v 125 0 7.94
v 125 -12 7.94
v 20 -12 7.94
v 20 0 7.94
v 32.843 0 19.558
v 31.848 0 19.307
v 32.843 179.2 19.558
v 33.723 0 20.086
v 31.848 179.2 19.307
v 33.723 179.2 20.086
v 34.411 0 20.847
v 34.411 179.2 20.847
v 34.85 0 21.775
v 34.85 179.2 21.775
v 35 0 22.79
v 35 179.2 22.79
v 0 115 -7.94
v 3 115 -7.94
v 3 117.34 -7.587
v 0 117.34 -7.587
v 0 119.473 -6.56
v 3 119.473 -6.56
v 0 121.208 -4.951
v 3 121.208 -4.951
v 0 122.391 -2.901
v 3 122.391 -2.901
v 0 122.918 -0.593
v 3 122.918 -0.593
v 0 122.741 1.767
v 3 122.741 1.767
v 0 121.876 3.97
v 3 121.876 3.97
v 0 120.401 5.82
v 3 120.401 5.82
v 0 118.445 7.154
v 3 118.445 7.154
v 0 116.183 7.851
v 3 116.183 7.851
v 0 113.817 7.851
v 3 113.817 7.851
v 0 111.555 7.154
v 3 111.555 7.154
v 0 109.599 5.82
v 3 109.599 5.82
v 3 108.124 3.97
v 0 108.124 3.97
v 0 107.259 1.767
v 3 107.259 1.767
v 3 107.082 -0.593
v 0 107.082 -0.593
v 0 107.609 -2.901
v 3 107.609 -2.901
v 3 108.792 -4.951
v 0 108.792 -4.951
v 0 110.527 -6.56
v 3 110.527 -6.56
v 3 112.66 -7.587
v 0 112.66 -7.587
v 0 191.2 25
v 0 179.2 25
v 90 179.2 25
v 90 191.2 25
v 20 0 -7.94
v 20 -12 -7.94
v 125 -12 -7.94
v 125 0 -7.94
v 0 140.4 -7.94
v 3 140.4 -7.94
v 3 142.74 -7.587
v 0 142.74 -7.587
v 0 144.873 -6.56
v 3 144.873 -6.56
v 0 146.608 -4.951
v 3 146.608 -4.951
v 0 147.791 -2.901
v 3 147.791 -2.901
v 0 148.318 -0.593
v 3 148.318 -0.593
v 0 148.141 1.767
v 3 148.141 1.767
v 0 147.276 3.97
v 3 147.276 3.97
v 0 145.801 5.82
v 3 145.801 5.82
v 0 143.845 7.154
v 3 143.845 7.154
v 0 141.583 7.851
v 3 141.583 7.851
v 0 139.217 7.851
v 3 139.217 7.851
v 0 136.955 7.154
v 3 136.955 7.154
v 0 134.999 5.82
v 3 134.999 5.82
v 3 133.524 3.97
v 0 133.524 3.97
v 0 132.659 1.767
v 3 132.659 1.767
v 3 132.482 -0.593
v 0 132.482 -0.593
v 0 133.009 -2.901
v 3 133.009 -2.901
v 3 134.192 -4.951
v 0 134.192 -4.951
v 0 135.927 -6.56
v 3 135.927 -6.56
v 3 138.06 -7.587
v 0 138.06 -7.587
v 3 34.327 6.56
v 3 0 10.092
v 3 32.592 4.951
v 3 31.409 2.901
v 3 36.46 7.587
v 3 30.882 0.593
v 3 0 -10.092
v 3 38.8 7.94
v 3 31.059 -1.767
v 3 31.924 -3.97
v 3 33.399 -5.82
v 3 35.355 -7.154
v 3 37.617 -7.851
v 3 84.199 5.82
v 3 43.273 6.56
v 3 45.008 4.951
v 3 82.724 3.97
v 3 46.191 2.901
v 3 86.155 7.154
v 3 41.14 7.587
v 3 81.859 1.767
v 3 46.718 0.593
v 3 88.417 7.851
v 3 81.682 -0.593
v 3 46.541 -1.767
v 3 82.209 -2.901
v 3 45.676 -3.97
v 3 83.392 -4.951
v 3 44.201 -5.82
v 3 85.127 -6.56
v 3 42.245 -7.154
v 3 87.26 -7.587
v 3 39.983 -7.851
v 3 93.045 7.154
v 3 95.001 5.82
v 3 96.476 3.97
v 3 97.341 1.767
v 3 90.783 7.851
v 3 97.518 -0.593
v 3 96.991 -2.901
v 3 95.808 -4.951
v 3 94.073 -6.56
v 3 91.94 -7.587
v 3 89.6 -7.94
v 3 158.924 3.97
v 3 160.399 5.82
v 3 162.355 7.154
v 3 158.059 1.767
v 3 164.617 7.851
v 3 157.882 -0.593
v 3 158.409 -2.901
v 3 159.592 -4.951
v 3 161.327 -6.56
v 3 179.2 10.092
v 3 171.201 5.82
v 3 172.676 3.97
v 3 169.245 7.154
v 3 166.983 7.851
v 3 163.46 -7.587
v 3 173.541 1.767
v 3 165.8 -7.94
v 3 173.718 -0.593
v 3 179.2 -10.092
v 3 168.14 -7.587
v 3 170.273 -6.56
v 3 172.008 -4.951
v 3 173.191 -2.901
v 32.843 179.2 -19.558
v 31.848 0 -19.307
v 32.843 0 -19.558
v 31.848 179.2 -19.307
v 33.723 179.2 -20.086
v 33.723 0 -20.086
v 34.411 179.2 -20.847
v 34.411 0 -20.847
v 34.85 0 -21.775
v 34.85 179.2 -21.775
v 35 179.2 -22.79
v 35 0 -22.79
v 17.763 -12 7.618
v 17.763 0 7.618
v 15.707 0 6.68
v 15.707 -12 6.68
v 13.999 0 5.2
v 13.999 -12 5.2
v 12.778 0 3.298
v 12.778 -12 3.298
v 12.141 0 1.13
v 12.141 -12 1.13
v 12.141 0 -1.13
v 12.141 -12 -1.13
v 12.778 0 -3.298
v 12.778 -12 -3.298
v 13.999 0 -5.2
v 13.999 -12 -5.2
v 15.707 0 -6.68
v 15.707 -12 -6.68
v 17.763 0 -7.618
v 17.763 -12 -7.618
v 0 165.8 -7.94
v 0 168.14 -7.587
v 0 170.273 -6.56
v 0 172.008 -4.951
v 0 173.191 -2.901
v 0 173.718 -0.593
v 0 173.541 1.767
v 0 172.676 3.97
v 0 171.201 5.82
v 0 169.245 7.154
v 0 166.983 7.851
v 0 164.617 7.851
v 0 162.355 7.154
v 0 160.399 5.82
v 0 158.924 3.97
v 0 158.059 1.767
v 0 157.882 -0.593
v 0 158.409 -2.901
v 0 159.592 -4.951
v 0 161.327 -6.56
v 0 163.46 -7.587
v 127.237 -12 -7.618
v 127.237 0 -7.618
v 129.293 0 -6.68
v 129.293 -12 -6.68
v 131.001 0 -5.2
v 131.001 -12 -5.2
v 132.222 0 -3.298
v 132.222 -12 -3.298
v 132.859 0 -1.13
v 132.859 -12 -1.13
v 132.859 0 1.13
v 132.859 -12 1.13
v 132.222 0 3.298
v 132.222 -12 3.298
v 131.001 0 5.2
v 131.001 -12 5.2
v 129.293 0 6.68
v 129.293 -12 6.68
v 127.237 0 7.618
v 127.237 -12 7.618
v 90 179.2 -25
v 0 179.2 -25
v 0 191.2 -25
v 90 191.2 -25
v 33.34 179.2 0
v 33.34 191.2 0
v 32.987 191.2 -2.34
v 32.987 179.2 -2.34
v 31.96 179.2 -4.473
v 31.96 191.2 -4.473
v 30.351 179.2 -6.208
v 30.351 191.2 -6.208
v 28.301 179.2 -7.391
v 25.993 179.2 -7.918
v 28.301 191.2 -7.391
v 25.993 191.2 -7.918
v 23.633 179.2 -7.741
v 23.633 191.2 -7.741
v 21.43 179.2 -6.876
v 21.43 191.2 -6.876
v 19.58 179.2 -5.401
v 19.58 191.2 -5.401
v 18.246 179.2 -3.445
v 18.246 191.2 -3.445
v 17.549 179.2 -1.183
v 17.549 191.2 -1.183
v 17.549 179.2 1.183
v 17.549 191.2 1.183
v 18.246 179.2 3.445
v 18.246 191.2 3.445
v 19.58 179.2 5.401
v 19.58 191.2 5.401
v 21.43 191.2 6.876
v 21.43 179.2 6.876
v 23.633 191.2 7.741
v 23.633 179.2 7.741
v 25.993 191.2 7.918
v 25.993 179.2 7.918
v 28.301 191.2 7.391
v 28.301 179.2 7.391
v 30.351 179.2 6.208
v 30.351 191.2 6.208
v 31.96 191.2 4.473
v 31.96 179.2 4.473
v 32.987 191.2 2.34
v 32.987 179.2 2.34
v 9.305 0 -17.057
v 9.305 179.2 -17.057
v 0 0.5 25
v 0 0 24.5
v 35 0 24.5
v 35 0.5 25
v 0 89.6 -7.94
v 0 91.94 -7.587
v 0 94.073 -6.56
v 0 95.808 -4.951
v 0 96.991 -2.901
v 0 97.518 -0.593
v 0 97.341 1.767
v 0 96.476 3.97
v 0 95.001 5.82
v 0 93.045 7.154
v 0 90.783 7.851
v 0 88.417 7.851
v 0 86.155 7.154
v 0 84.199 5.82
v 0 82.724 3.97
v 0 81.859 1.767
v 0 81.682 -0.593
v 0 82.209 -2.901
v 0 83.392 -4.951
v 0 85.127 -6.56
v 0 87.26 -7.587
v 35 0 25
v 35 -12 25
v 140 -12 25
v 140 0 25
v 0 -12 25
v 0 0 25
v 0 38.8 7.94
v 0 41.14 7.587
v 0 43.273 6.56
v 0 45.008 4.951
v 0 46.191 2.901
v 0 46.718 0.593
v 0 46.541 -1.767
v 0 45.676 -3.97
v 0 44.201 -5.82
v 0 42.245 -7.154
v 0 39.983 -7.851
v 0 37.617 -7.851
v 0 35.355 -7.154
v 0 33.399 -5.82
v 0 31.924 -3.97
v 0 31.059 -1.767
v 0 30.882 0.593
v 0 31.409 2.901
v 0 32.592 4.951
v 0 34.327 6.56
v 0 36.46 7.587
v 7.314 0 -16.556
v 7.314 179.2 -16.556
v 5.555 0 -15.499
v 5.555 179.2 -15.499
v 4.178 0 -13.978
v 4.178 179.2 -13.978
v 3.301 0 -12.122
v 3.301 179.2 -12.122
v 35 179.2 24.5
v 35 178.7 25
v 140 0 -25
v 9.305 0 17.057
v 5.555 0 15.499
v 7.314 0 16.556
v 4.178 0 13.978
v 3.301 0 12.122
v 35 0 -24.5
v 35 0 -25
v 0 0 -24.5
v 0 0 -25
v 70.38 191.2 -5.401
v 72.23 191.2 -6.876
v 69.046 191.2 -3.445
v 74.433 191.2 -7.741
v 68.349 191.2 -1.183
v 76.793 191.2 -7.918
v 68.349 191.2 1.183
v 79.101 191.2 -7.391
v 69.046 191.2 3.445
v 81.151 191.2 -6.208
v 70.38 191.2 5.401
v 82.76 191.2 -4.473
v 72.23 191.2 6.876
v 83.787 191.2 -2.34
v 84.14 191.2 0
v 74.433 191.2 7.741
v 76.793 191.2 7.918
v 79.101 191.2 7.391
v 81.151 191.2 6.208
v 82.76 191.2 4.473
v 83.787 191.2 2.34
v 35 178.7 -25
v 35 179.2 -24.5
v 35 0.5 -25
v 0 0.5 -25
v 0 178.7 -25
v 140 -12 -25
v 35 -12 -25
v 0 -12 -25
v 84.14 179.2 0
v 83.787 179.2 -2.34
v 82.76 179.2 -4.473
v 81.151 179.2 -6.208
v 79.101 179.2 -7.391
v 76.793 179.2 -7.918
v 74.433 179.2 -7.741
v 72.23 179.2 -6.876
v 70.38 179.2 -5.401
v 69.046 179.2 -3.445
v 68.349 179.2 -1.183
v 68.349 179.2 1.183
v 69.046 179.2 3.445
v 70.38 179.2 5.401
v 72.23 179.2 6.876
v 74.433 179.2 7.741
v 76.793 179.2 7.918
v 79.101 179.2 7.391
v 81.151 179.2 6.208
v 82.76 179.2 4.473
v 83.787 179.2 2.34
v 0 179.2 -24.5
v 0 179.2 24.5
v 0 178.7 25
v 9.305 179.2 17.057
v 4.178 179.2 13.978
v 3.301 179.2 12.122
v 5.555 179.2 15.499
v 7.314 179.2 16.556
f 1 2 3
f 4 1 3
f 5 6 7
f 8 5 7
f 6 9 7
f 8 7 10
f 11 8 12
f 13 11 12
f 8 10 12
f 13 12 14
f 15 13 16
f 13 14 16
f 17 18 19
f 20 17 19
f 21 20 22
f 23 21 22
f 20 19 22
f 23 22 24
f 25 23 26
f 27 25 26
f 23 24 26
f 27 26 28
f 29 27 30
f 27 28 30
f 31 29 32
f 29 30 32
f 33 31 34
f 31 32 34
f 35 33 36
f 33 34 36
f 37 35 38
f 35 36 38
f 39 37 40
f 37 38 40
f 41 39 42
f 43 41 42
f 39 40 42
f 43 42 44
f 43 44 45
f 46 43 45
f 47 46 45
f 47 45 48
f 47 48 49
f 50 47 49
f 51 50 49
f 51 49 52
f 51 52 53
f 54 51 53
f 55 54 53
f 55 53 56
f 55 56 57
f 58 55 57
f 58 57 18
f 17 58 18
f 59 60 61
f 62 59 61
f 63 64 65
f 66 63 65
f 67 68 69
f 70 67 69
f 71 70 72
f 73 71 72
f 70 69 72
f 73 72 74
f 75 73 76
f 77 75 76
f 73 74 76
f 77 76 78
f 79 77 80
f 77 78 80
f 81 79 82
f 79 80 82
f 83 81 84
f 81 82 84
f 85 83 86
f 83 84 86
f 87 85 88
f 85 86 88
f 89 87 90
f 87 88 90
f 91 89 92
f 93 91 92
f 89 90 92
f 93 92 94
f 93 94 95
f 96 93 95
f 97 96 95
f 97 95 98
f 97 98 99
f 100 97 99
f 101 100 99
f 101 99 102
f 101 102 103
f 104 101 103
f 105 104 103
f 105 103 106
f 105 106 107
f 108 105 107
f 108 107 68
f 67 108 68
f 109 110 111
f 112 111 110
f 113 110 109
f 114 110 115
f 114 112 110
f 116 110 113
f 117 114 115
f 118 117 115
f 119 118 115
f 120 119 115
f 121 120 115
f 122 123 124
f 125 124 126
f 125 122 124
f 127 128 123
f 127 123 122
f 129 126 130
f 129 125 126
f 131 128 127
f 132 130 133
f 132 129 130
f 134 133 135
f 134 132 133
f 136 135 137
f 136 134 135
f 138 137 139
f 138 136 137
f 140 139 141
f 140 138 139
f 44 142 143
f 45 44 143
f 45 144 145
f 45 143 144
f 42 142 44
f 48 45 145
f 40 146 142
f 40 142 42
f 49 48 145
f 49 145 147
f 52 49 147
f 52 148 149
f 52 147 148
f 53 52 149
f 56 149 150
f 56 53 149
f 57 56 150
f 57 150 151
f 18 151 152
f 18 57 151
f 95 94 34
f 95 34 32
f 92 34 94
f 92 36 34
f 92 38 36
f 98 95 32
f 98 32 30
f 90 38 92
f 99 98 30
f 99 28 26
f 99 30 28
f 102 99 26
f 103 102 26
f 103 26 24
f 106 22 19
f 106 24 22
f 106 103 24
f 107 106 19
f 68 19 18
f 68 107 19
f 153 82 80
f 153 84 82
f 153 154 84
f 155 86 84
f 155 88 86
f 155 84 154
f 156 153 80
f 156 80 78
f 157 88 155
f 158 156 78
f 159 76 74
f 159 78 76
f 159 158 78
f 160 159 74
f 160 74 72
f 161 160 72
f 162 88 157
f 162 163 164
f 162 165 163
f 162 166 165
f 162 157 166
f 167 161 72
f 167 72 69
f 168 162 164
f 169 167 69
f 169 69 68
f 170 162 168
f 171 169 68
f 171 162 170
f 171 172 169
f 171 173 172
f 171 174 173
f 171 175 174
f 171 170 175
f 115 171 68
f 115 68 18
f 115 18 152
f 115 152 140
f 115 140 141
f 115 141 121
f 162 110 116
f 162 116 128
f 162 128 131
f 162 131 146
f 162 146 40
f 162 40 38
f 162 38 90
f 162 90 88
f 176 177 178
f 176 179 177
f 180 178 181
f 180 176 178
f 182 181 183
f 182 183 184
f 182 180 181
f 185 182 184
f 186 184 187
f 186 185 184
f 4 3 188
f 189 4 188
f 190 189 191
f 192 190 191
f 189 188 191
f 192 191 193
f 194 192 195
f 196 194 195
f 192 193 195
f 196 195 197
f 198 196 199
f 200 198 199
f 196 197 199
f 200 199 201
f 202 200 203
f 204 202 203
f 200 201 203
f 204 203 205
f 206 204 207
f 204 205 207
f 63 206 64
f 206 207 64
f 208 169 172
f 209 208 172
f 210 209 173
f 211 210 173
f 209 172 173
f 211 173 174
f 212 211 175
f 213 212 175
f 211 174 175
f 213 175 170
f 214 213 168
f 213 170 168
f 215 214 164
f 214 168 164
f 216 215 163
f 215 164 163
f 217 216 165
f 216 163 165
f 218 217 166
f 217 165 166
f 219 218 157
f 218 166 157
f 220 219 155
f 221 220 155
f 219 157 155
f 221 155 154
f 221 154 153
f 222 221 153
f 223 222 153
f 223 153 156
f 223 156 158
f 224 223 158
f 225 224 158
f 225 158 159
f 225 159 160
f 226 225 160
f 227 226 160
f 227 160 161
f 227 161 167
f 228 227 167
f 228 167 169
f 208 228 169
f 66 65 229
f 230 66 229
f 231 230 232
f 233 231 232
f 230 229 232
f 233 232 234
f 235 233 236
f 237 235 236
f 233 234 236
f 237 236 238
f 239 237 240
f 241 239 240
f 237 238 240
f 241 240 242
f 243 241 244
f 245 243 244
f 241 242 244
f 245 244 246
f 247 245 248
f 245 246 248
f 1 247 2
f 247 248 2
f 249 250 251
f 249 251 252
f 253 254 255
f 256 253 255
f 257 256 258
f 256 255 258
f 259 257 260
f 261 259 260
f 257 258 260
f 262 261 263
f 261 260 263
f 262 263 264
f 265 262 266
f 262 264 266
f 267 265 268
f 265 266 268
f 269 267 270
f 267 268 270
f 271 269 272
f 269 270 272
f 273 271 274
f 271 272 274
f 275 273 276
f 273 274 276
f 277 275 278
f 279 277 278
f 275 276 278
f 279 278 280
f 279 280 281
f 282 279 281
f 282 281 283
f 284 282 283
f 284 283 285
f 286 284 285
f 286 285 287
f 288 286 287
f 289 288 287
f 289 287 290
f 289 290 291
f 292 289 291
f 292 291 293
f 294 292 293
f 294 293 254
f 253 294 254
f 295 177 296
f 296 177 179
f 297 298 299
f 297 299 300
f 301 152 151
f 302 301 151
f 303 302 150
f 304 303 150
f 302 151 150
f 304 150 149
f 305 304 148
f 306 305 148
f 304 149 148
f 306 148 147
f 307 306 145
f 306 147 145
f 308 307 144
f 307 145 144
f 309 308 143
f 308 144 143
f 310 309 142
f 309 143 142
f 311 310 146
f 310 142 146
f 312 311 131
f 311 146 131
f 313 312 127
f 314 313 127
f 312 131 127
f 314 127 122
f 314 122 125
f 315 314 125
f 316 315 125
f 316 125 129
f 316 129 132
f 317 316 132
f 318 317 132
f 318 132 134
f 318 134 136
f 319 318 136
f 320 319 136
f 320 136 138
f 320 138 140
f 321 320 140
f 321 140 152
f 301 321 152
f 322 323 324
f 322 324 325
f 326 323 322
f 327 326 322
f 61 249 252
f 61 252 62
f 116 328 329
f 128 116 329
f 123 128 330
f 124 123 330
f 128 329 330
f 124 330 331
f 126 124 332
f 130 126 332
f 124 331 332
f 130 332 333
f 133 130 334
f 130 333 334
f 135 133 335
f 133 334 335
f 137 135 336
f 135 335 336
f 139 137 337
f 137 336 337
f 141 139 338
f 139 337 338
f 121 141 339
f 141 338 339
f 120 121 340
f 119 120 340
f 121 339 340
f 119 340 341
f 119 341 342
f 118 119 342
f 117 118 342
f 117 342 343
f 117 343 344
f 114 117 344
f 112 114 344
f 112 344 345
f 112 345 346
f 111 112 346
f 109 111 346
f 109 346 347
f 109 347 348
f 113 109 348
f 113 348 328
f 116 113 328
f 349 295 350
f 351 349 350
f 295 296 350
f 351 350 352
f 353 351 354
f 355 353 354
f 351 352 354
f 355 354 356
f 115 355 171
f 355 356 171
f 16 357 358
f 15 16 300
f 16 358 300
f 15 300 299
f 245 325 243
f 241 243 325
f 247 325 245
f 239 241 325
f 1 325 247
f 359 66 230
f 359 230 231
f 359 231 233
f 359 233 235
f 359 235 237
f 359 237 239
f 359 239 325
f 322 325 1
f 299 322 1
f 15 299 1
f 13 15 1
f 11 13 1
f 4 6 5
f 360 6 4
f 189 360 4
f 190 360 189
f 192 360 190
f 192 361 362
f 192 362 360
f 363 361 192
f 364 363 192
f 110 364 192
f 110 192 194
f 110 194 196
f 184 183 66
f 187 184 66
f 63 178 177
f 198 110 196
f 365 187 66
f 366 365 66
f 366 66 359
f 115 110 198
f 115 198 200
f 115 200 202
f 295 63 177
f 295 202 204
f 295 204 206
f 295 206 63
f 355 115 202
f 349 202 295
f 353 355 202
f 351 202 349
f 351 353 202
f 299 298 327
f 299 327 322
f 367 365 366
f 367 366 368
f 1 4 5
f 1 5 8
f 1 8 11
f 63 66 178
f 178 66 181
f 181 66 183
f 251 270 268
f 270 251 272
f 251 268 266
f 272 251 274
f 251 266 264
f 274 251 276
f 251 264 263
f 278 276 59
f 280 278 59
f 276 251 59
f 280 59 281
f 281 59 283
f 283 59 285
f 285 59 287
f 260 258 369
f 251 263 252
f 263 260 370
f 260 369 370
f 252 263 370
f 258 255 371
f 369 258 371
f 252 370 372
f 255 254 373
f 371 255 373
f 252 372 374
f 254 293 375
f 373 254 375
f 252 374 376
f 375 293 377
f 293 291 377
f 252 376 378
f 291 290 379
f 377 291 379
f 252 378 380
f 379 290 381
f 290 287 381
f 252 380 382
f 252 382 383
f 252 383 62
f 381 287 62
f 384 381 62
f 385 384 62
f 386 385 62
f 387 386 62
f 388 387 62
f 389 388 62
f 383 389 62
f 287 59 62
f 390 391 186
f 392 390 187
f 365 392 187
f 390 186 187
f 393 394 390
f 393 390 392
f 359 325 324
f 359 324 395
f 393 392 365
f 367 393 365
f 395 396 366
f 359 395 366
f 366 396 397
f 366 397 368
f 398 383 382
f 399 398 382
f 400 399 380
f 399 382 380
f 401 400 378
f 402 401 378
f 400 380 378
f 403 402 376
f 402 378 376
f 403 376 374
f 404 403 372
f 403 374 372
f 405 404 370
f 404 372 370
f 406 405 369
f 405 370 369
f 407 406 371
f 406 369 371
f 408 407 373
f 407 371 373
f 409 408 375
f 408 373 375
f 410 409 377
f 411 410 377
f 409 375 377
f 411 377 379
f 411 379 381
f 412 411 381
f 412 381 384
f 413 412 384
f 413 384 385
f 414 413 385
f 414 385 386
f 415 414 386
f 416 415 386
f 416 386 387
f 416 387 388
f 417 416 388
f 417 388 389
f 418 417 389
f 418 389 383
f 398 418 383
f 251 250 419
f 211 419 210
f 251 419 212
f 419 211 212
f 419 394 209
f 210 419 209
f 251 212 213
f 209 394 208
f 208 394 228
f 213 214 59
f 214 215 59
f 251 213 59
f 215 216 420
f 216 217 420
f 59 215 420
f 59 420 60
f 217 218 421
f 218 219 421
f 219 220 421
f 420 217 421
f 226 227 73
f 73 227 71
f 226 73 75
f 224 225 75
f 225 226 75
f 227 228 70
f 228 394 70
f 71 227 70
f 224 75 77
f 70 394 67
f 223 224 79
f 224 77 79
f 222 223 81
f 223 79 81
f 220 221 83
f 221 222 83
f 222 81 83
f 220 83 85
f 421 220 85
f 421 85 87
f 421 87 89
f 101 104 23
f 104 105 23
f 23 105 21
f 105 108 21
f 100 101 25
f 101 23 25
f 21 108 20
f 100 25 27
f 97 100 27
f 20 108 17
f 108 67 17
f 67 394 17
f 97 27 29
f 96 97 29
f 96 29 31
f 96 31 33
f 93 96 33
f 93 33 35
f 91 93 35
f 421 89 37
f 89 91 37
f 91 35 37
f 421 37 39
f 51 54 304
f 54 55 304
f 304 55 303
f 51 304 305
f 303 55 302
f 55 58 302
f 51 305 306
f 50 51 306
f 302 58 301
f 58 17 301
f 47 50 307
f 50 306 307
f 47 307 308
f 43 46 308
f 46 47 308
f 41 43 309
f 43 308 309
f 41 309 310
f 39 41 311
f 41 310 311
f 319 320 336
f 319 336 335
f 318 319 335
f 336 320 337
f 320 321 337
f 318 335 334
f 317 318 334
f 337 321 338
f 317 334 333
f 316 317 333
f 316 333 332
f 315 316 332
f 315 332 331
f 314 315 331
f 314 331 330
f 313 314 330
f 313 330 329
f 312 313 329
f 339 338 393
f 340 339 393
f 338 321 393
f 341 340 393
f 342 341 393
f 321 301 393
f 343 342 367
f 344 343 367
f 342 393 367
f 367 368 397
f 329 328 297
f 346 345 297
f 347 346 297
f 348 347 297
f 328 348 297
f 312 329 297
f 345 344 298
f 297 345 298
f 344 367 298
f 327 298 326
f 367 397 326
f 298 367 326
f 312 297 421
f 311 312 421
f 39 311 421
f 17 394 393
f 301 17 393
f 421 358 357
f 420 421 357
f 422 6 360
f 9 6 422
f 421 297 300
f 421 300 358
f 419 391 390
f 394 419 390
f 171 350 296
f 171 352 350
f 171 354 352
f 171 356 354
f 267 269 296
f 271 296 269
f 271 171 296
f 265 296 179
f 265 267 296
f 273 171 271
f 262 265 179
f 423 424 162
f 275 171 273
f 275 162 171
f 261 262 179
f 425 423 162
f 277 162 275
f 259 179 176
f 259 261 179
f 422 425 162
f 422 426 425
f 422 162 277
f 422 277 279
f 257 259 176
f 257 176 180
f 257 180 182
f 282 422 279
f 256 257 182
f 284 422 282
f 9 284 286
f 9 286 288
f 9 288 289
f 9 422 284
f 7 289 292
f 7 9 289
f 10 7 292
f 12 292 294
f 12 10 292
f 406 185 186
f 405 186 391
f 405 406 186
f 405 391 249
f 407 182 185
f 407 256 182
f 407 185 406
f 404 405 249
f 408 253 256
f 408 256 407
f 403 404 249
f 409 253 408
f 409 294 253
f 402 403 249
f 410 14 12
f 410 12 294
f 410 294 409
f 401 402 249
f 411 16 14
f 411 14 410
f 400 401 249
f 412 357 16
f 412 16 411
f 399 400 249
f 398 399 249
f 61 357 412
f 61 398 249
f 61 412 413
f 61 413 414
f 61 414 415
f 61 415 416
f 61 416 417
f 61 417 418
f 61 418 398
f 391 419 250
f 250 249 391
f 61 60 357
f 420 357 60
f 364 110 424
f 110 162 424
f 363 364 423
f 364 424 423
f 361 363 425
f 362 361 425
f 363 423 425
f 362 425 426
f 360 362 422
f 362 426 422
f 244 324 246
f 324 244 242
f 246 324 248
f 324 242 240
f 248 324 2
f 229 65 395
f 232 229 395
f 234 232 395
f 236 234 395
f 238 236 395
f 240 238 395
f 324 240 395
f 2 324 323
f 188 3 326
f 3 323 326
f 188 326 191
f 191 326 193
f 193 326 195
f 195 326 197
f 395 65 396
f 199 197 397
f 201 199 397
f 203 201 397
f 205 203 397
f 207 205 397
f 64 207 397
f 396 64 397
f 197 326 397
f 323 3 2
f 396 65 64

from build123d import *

# Parameters (mm, degrees)
SKETCH1_W                 = 90
SKETCH1_H                 = 50
BOSS_EXTRUDE1_DEPTH       = 11.999999994
BOSS_EXTRUDE2_DEPTH       = 35
SKETCH3_W                 = 50
SKETCH3_H                 = 12
BOSS_EXTRUDE3_DEPTH       = 105
SKETCH4_W                 = 32.855882012
SKETCH4_H                 = 179.2
CUT_EXTRUDE1_DEPTH        = 32
CUT_EXTRUDE2_REACH        = 250.023
DRAFT1_ANGLE              = 5.699999999
M13_CLEARANCE_HOLE1_D     = 15.88
M13_CLEARANCE_HOLE2_D     = 15.88
M13_CLEARANCE_HOLE2_DEPTH = 140
M13_CLEARANCE_HOLE3_D     = 15.88
FILLET1_R                 = 3.5
FILLET2_R                 = 7


with BuildPart() as part:
    # Sketch1 → Boss-Extrude1 (new body)
    with BuildSketch(Plane.XZ.offset(-179.2)):
        with Locations((45, 0)):
            Rectangle(SKETCH1_W, SKETCH1_H)
    extrude(amount=-BOSS_EXTRUDE1_DEPTH)

    # Sketch2 → Boss-Extrude2 (add)
    with BuildSketch(Plane(origin=(0, 0, 0), x_dir=(0, -1, 0), z_dir=(-1, 0, 0))):
        Polygon((-0.5, -25), (0, -24.5), (0, -25), (12, -25), (12, 25), (0, 25), (0, 24.5), (-0.500000019, 25), (-178.7, 25), (-179.2, 24.5), (-179.2, -24.5), (-178.7, -25), align=None)
    extrude(amount=-BOSS_EXTRUDE2_DEPTH)

    # Sketch3 → Boss-Extrude3 (add)
    with BuildSketch(Plane(origin=(35, 0, 0), x_dir=(0, 0, -1), z_dir=(1, 0, 0))):
        with Locations((0, -5.999999989)):
            Rectangle(SKETCH3_W, SKETCH3_H)
    extrude(amount=BOSS_EXTRUDE3_DEPTH)

    # Sketch4 → Cut-Extrude1 (cut)
    with BuildSketch(Plane(origin=(35, 0, 0), x_dir=(0, 0, -1), z_dir=(1, 0, 0))):
        with Locations((0, 89.600000011)):
            Rectangle(SKETCH4_W, SKETCH4_H)
    extrude(amount=-CUT_EXTRUDE1_DEPTH, mode=Mode.SUBTRACT)

    # Sketch5 → Cut-Extrude2 (cut, up to next)
    with BuildSketch(Plane.XZ.offset(12), mode=Mode.PRIVATE) as cut_extrude2_sk1:
        with BuildLine():
            Line((125, 7.94), (20, 7.94))
            ThreePointArc((20, 7.94), (12.06, 0), (20, -7.94))
            Line((20, -7.94), (125, -7.94))
            ThreePointArc((125, -7.94), (132.94, 0), (125, 7.94))
        make_face()
    cut_extrude2_tool1 = extrude(cut_extrude2_sk1.sketch, amount=-CUT_EXTRUDE2_REACH, mode=Mode.PRIVATE) & part.part
    add(cut_extrude2_tool1.solids().sort_by_distance((72.5, -12, 0))[0], mode=Mode.SUBTRACT)

    # Draft1
    draft1_faces = [part.faces().sort_by_distance(p)[0] for p in [
        (19, 89.600000011, -16.427941006),
        (19, 89.600000011, 16.427941006),
    ]]
    draft(draft1_faces, Plane(origin=(3, 0, 0), x_dir=(0, 0, 1), z_dir=(1, 0, 0)), DRAFT1_ANGLE)

    # M13 Clearance Hole1 (through all)
    with Locations(Plane(origin=(3, 0, 0), x_dir=(0, 0, -1), z_dir=(1, 0, 0))):
        with Locations((0, 38.8)):
            Hole(M13_CLEARANCE_HOLE1_D / 2)

    # M13 Clearance Hole2
    with Locations(Plane.ZY):
        with Locations((0, 89.6), (0, 115), (0, 140.4), (0, 165.8)):
            Hole(M13_CLEARANCE_HOLE2_D / 2, depth=M13_CLEARANCE_HOLE2_DEPTH)

    # M13 Clearance Hole3 (through all)
    with Locations(Plane(origin=(0, 179.2, 0), x_dir=(-1, 0, 0), z_dir=(0, -1, 0))):
        with Locations((-76.2, 0), (-25.4, 0)):
            Hole(M13_CLEARANCE_HOLE3_D / 2)

    # Fillet1
    fillet1_edges = [part.edges().sort_by_distance(p)[0] for p in [
        (35, 89.6, 19.621965629),
        (35, 89.6, -19.621965629),
    ]]
    fillet(fillet1_edges, radius=FILLET1_R)

    # Fillet2
    fillet2_edges = [part.edges().sort_by_distance(p)[0] for p in [
        (3, 89.6, 16.427941006),
        (3, 89.6, -16.427941006),
    ]]
    fillet(fillet2_edges, radius=FILLET2_R)


solid = part.part
